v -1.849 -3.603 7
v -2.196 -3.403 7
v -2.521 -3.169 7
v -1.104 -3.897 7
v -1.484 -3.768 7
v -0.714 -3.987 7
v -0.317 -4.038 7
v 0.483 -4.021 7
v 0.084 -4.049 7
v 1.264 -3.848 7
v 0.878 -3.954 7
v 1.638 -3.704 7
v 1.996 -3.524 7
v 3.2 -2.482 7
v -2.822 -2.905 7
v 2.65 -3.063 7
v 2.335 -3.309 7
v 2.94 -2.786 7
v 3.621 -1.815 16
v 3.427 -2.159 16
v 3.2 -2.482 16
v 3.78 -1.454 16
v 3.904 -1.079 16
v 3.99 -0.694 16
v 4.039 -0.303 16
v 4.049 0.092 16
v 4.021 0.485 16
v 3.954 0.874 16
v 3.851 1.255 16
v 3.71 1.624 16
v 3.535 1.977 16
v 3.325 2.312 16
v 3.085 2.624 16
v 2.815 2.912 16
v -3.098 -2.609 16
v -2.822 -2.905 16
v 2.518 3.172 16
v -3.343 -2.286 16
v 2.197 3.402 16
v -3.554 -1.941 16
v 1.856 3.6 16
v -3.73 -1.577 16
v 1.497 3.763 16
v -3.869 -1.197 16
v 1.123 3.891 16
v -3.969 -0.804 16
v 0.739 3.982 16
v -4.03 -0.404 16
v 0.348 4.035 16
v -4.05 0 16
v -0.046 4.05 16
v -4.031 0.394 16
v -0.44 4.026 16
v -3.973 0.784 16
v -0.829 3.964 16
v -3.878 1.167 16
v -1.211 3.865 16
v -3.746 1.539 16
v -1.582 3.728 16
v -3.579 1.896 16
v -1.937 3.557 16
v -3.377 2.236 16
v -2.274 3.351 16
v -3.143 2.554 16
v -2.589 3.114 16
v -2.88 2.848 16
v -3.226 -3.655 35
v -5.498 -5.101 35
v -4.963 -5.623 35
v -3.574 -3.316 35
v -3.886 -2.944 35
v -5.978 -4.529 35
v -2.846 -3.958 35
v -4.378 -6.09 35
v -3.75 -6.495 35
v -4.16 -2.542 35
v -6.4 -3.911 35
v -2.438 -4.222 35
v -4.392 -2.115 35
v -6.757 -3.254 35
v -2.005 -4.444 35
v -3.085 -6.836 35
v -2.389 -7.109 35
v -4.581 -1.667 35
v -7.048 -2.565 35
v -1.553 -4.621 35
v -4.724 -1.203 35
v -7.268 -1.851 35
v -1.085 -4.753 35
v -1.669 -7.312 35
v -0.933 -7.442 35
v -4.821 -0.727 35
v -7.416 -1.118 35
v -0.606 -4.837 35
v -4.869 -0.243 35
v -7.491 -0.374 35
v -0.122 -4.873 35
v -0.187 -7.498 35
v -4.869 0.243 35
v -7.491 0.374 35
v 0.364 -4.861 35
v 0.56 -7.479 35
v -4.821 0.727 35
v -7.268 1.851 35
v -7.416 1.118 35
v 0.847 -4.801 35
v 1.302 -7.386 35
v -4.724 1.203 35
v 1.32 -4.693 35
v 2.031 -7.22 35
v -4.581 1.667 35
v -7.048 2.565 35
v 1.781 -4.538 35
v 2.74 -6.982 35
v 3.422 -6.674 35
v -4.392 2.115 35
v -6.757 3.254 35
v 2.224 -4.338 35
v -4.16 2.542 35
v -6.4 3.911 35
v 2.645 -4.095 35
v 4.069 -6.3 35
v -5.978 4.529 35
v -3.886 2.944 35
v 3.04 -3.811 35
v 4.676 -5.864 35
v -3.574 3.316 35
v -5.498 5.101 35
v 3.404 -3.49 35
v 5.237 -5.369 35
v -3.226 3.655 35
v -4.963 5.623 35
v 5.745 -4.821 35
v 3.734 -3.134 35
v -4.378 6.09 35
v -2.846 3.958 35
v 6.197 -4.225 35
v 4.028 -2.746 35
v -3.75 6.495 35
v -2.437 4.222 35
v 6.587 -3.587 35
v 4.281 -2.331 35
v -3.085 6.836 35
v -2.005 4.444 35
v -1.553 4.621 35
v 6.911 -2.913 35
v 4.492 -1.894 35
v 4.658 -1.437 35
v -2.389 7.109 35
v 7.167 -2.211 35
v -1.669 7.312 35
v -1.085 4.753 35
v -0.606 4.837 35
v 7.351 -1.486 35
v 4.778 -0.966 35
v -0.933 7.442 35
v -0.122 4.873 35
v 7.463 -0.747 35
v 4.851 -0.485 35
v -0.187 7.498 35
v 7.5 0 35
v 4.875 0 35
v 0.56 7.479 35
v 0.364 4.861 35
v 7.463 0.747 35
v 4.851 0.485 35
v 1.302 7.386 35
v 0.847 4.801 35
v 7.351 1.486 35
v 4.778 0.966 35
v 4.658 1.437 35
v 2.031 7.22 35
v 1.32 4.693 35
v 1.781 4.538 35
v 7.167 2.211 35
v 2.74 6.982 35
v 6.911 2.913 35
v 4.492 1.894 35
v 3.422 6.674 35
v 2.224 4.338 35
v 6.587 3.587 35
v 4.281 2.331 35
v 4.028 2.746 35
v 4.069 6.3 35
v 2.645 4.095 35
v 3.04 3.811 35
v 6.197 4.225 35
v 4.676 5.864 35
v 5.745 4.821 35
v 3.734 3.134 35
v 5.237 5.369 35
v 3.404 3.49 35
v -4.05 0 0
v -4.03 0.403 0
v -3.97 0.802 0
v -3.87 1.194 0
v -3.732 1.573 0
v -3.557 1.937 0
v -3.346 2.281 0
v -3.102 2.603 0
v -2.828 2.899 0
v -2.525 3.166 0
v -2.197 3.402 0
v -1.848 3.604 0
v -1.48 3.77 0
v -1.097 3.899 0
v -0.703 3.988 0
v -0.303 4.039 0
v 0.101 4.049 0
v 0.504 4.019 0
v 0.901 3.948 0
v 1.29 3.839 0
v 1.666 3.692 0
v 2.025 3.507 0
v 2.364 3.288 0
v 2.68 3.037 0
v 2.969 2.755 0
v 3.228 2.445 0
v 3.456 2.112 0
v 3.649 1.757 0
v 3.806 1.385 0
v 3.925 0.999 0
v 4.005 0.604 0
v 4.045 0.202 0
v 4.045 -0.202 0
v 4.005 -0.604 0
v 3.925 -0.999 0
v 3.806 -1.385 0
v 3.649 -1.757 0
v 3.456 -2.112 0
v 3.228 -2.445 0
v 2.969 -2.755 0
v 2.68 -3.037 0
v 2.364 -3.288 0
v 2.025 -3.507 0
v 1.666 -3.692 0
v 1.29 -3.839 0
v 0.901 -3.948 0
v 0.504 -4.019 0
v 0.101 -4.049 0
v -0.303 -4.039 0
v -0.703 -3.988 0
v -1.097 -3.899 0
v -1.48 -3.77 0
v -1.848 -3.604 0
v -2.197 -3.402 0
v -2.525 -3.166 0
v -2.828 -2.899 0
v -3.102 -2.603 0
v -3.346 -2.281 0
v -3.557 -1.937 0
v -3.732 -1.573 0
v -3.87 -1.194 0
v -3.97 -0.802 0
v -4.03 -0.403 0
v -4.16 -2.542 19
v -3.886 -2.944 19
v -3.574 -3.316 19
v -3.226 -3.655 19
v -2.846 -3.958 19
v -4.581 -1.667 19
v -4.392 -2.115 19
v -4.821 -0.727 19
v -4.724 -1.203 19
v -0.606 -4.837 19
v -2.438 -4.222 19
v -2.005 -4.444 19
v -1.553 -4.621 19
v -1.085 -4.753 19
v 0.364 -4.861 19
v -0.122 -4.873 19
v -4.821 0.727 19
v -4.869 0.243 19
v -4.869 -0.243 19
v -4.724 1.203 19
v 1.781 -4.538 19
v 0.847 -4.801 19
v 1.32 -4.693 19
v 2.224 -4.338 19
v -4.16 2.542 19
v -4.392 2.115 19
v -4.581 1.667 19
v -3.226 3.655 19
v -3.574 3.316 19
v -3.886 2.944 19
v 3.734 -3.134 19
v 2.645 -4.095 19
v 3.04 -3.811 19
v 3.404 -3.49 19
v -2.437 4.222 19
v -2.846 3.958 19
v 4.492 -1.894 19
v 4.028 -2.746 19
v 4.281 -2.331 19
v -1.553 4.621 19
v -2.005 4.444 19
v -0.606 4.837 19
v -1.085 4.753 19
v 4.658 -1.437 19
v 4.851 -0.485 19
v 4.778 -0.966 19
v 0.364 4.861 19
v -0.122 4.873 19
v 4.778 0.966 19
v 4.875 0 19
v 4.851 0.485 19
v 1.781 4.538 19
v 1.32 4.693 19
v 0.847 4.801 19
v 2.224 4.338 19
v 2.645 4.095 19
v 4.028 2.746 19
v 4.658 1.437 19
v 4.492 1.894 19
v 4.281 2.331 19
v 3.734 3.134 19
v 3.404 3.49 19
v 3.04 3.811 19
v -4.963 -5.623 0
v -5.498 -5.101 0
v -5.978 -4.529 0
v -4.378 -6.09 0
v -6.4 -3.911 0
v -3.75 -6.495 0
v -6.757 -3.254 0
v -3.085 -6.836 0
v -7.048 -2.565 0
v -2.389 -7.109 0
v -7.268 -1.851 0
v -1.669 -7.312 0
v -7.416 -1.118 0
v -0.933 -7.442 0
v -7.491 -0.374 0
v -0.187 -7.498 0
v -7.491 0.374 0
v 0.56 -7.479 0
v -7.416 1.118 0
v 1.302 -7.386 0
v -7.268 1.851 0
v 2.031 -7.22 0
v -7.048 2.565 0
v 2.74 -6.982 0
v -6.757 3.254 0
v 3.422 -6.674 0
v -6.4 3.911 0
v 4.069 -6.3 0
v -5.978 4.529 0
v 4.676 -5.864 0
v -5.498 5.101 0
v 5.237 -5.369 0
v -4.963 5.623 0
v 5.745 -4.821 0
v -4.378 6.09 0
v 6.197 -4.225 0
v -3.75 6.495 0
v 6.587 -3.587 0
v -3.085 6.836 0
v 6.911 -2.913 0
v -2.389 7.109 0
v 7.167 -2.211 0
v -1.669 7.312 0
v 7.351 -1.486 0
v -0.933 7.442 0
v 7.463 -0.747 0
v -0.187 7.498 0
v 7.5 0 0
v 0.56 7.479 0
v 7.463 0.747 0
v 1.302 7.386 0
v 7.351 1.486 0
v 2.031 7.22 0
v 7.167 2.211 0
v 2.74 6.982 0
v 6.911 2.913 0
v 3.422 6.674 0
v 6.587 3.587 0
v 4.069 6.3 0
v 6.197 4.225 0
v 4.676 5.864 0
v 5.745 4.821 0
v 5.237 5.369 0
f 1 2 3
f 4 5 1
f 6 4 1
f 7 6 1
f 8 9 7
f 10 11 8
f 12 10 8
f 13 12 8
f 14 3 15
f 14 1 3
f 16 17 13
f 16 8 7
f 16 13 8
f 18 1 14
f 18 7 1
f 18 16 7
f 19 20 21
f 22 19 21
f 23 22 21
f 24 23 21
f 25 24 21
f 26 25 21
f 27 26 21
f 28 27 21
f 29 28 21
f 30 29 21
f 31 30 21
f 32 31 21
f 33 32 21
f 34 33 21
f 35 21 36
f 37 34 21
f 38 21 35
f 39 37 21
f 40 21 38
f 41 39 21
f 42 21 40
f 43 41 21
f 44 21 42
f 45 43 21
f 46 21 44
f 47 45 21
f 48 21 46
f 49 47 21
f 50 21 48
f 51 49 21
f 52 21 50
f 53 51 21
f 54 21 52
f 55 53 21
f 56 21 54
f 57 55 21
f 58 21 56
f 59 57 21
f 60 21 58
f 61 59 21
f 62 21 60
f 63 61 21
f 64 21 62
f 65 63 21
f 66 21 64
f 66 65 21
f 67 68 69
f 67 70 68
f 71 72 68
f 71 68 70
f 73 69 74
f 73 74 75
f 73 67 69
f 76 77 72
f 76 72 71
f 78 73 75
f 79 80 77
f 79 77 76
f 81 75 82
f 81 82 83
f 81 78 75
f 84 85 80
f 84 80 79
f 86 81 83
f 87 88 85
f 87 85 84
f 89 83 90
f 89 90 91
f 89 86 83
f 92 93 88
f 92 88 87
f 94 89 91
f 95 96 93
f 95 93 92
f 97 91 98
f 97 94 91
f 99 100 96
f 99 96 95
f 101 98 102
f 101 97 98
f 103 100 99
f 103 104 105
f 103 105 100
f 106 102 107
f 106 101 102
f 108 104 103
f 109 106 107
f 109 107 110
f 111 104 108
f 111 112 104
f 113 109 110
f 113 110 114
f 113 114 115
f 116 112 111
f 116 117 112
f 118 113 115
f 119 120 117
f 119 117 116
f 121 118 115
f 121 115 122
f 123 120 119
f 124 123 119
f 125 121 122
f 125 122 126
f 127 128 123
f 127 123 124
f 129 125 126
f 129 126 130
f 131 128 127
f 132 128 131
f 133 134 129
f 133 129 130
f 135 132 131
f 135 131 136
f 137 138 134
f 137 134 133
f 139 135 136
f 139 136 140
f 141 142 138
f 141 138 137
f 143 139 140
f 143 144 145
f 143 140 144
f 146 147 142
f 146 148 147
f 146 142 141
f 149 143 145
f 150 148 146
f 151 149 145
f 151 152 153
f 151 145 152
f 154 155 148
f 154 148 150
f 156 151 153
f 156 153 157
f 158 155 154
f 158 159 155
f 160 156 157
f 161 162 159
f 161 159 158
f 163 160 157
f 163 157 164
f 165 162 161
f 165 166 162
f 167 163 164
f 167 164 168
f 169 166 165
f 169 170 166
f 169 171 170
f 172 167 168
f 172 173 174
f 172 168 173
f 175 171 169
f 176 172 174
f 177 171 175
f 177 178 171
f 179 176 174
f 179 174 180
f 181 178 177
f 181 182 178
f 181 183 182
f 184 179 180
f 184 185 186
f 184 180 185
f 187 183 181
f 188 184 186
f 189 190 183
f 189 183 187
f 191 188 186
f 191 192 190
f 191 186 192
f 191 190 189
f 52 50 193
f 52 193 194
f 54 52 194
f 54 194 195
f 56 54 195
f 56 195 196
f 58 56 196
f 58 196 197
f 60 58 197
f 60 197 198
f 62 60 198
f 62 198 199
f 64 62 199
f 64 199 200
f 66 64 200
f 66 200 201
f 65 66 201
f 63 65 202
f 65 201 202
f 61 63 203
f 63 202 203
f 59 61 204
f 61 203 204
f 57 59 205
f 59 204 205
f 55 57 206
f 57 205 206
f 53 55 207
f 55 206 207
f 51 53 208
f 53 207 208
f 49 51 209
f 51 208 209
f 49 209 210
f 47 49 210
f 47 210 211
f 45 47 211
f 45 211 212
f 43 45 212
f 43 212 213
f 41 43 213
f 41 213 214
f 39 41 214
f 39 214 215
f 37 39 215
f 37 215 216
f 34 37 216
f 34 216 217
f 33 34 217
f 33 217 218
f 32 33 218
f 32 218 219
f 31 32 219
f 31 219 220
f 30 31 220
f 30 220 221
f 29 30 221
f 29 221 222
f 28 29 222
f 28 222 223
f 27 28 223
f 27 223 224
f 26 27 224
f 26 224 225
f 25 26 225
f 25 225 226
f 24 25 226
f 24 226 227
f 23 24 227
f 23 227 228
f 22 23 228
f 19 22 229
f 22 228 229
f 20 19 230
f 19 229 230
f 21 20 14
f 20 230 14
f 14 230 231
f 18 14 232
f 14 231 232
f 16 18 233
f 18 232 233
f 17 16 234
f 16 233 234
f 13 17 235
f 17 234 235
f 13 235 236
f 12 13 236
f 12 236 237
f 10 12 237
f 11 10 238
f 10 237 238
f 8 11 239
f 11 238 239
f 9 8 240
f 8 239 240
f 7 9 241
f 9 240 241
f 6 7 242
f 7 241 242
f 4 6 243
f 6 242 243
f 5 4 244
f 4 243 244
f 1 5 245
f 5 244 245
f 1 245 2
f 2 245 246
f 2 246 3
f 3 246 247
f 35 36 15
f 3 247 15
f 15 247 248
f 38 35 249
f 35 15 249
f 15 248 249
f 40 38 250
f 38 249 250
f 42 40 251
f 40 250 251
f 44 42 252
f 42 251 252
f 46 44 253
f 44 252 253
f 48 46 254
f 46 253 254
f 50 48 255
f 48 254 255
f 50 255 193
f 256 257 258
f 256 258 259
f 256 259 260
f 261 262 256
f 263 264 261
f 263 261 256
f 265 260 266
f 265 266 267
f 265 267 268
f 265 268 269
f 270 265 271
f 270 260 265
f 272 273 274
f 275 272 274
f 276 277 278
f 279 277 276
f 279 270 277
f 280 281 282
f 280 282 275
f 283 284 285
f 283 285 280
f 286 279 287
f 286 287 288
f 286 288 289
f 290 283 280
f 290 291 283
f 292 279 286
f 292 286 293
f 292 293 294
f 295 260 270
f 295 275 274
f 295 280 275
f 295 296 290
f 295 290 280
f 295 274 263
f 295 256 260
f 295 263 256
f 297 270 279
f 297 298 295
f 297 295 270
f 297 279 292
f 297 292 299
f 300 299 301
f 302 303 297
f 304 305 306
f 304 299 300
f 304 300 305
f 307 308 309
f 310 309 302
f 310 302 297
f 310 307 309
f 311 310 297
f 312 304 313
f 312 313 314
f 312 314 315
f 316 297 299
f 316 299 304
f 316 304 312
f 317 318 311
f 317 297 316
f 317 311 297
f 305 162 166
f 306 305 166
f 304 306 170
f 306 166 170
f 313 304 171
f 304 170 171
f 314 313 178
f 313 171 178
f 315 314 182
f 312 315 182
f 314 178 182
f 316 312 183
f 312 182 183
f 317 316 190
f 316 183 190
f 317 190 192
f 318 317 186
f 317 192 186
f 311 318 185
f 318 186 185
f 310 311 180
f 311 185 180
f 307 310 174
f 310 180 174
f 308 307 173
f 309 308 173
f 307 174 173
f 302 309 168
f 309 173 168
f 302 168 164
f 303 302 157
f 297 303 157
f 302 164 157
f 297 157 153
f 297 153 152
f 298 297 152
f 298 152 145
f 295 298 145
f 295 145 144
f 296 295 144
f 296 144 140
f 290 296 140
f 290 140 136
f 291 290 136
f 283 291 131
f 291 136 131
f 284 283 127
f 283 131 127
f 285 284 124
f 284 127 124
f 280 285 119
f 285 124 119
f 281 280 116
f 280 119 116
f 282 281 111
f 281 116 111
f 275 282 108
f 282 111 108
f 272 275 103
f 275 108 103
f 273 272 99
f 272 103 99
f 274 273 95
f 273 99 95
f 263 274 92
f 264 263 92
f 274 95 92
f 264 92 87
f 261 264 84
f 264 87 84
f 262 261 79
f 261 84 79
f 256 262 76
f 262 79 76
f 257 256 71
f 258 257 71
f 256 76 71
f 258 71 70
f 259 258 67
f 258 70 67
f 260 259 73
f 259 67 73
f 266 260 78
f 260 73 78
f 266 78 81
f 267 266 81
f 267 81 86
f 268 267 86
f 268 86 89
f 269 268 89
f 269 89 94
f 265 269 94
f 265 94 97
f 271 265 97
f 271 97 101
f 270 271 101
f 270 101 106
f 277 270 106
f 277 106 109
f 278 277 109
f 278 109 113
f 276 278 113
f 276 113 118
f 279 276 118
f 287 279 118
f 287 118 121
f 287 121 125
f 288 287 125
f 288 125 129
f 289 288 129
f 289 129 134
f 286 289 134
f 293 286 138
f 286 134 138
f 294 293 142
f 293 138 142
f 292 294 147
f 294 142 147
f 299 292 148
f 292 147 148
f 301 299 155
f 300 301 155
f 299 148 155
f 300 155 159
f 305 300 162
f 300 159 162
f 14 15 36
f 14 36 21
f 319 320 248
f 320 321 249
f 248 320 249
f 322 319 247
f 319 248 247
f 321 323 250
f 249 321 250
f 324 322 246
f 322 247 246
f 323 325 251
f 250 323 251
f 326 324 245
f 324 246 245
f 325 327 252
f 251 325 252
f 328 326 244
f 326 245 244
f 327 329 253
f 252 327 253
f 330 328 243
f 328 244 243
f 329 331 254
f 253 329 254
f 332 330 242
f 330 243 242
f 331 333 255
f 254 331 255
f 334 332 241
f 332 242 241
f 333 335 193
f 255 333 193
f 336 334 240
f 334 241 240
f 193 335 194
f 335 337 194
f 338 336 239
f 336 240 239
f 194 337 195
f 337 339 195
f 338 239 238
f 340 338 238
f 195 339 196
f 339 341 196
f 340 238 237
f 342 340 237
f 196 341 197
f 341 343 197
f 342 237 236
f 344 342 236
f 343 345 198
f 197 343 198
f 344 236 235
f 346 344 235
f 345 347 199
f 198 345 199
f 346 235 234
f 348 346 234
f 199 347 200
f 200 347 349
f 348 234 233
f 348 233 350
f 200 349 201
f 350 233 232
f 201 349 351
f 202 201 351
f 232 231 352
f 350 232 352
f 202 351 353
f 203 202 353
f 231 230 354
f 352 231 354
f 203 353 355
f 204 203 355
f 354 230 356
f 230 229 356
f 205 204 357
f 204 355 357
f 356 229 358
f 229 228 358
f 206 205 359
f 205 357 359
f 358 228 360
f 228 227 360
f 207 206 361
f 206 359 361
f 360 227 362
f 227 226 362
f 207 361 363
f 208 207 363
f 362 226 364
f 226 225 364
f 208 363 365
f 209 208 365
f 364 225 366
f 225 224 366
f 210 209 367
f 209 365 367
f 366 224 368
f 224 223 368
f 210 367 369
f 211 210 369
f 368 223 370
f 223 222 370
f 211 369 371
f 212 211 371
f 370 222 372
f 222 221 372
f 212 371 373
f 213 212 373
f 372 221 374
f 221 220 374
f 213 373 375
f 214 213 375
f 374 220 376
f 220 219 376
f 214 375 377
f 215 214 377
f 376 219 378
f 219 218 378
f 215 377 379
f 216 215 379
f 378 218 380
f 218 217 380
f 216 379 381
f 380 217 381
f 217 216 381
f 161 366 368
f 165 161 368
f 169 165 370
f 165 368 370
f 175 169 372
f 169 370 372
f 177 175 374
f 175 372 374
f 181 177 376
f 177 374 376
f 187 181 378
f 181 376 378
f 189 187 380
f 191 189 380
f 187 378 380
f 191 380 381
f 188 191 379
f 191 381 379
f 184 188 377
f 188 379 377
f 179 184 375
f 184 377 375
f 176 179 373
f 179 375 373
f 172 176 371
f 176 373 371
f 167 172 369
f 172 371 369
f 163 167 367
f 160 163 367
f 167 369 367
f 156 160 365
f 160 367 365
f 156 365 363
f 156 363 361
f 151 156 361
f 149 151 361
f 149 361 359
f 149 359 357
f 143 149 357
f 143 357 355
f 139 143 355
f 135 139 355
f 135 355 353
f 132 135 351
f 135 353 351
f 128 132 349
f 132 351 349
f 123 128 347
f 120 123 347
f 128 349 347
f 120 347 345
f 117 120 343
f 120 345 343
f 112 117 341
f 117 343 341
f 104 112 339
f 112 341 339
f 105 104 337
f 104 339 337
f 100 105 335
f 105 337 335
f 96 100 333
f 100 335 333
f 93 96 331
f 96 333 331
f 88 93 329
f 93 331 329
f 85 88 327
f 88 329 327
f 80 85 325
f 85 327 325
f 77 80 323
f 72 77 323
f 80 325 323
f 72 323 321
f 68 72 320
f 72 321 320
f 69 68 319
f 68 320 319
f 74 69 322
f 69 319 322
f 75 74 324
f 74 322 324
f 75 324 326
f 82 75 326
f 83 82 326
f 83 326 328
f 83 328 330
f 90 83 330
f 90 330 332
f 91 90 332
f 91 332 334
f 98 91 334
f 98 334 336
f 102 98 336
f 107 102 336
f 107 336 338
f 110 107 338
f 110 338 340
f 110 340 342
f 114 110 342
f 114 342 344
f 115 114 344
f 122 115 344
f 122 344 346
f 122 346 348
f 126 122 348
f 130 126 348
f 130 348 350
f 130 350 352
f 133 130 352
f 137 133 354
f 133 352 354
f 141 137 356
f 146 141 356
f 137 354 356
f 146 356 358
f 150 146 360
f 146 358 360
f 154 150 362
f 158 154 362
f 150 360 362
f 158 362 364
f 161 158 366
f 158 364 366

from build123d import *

# Parameters (mm, degrees)
ESQUISSE1_R             = 7.5
BOSS_EXTRU_1_DEPTH      = 35
ESQUISSE2_R             = 4.875
ENL_V_MAT_EXTRU_1_DEPTH = 16
ESQUISSE3_R             = 4.05
ENL_V_MAT_EXTRU_2_DEPTH = 16
BOSS_EXTRU_3_START      = 9
BOSS_EXTRU_3_DEPTH      = 9


with BuildPart() as part:
    # Esquisse1 → Boss.-Extru.1 (new body)
    with BuildSketch(Plane(origin=(0, 0, 0), x_dir=(0, 1, 0), z_dir=(0, 0, 1))):
        with Locations(Location((0, 0, 0), (0, 0, 270))):
            Circle(ESQUISSE1_R)
    extrude(amount=BOSS_EXTRU_1_DEPTH)

    # Esquisse2 → Enlèv. mat.-Extru.1 (cut)
    with BuildSketch(Plane.XY.offset(35)):
        Circle(ESQUISSE2_R)
    extrude(amount=-ENL_V_MAT_EXTRU_1_DEPTH, mode=Mode.SUBTRACT)

    # Esquisse3 → Enlèv. mat.-Extru.2 (cut)
    with BuildSketch(Plane(origin=(0, 0, 0), x_dir=(1, 0, 0), z_dir=(0, 0, -1))):
        with Locations(Location((0, 0, 0), (0, 0, 180))):
            Circle(ESQUISSE3_R)
    extrude(amount=-ENL_V_MAT_EXTRU_2_DEPTH, mode=Mode.SUBTRACT)

    # Esquisse5 → Boss.-Extru.3 (add)
    with BuildSketch(Plane(origin=(0, 0, 16), x_dir=(1, 0, 0), z_dir=(0, 0, -1)).offset(BOSS_EXTRU_3_START)):
        with BuildLine():
            Line((-2.822041762, 2.904923458), (3.200496338, 2.481798378))
            ThreePointArc((3.200496338, 2.481798378), (0.283840932, 4.040041377), (-2.822041762, 2.904923458))
        make_face()
    extrude(amount=-BOSS_EXTRU_3_DEPTH)


solid = part.part
